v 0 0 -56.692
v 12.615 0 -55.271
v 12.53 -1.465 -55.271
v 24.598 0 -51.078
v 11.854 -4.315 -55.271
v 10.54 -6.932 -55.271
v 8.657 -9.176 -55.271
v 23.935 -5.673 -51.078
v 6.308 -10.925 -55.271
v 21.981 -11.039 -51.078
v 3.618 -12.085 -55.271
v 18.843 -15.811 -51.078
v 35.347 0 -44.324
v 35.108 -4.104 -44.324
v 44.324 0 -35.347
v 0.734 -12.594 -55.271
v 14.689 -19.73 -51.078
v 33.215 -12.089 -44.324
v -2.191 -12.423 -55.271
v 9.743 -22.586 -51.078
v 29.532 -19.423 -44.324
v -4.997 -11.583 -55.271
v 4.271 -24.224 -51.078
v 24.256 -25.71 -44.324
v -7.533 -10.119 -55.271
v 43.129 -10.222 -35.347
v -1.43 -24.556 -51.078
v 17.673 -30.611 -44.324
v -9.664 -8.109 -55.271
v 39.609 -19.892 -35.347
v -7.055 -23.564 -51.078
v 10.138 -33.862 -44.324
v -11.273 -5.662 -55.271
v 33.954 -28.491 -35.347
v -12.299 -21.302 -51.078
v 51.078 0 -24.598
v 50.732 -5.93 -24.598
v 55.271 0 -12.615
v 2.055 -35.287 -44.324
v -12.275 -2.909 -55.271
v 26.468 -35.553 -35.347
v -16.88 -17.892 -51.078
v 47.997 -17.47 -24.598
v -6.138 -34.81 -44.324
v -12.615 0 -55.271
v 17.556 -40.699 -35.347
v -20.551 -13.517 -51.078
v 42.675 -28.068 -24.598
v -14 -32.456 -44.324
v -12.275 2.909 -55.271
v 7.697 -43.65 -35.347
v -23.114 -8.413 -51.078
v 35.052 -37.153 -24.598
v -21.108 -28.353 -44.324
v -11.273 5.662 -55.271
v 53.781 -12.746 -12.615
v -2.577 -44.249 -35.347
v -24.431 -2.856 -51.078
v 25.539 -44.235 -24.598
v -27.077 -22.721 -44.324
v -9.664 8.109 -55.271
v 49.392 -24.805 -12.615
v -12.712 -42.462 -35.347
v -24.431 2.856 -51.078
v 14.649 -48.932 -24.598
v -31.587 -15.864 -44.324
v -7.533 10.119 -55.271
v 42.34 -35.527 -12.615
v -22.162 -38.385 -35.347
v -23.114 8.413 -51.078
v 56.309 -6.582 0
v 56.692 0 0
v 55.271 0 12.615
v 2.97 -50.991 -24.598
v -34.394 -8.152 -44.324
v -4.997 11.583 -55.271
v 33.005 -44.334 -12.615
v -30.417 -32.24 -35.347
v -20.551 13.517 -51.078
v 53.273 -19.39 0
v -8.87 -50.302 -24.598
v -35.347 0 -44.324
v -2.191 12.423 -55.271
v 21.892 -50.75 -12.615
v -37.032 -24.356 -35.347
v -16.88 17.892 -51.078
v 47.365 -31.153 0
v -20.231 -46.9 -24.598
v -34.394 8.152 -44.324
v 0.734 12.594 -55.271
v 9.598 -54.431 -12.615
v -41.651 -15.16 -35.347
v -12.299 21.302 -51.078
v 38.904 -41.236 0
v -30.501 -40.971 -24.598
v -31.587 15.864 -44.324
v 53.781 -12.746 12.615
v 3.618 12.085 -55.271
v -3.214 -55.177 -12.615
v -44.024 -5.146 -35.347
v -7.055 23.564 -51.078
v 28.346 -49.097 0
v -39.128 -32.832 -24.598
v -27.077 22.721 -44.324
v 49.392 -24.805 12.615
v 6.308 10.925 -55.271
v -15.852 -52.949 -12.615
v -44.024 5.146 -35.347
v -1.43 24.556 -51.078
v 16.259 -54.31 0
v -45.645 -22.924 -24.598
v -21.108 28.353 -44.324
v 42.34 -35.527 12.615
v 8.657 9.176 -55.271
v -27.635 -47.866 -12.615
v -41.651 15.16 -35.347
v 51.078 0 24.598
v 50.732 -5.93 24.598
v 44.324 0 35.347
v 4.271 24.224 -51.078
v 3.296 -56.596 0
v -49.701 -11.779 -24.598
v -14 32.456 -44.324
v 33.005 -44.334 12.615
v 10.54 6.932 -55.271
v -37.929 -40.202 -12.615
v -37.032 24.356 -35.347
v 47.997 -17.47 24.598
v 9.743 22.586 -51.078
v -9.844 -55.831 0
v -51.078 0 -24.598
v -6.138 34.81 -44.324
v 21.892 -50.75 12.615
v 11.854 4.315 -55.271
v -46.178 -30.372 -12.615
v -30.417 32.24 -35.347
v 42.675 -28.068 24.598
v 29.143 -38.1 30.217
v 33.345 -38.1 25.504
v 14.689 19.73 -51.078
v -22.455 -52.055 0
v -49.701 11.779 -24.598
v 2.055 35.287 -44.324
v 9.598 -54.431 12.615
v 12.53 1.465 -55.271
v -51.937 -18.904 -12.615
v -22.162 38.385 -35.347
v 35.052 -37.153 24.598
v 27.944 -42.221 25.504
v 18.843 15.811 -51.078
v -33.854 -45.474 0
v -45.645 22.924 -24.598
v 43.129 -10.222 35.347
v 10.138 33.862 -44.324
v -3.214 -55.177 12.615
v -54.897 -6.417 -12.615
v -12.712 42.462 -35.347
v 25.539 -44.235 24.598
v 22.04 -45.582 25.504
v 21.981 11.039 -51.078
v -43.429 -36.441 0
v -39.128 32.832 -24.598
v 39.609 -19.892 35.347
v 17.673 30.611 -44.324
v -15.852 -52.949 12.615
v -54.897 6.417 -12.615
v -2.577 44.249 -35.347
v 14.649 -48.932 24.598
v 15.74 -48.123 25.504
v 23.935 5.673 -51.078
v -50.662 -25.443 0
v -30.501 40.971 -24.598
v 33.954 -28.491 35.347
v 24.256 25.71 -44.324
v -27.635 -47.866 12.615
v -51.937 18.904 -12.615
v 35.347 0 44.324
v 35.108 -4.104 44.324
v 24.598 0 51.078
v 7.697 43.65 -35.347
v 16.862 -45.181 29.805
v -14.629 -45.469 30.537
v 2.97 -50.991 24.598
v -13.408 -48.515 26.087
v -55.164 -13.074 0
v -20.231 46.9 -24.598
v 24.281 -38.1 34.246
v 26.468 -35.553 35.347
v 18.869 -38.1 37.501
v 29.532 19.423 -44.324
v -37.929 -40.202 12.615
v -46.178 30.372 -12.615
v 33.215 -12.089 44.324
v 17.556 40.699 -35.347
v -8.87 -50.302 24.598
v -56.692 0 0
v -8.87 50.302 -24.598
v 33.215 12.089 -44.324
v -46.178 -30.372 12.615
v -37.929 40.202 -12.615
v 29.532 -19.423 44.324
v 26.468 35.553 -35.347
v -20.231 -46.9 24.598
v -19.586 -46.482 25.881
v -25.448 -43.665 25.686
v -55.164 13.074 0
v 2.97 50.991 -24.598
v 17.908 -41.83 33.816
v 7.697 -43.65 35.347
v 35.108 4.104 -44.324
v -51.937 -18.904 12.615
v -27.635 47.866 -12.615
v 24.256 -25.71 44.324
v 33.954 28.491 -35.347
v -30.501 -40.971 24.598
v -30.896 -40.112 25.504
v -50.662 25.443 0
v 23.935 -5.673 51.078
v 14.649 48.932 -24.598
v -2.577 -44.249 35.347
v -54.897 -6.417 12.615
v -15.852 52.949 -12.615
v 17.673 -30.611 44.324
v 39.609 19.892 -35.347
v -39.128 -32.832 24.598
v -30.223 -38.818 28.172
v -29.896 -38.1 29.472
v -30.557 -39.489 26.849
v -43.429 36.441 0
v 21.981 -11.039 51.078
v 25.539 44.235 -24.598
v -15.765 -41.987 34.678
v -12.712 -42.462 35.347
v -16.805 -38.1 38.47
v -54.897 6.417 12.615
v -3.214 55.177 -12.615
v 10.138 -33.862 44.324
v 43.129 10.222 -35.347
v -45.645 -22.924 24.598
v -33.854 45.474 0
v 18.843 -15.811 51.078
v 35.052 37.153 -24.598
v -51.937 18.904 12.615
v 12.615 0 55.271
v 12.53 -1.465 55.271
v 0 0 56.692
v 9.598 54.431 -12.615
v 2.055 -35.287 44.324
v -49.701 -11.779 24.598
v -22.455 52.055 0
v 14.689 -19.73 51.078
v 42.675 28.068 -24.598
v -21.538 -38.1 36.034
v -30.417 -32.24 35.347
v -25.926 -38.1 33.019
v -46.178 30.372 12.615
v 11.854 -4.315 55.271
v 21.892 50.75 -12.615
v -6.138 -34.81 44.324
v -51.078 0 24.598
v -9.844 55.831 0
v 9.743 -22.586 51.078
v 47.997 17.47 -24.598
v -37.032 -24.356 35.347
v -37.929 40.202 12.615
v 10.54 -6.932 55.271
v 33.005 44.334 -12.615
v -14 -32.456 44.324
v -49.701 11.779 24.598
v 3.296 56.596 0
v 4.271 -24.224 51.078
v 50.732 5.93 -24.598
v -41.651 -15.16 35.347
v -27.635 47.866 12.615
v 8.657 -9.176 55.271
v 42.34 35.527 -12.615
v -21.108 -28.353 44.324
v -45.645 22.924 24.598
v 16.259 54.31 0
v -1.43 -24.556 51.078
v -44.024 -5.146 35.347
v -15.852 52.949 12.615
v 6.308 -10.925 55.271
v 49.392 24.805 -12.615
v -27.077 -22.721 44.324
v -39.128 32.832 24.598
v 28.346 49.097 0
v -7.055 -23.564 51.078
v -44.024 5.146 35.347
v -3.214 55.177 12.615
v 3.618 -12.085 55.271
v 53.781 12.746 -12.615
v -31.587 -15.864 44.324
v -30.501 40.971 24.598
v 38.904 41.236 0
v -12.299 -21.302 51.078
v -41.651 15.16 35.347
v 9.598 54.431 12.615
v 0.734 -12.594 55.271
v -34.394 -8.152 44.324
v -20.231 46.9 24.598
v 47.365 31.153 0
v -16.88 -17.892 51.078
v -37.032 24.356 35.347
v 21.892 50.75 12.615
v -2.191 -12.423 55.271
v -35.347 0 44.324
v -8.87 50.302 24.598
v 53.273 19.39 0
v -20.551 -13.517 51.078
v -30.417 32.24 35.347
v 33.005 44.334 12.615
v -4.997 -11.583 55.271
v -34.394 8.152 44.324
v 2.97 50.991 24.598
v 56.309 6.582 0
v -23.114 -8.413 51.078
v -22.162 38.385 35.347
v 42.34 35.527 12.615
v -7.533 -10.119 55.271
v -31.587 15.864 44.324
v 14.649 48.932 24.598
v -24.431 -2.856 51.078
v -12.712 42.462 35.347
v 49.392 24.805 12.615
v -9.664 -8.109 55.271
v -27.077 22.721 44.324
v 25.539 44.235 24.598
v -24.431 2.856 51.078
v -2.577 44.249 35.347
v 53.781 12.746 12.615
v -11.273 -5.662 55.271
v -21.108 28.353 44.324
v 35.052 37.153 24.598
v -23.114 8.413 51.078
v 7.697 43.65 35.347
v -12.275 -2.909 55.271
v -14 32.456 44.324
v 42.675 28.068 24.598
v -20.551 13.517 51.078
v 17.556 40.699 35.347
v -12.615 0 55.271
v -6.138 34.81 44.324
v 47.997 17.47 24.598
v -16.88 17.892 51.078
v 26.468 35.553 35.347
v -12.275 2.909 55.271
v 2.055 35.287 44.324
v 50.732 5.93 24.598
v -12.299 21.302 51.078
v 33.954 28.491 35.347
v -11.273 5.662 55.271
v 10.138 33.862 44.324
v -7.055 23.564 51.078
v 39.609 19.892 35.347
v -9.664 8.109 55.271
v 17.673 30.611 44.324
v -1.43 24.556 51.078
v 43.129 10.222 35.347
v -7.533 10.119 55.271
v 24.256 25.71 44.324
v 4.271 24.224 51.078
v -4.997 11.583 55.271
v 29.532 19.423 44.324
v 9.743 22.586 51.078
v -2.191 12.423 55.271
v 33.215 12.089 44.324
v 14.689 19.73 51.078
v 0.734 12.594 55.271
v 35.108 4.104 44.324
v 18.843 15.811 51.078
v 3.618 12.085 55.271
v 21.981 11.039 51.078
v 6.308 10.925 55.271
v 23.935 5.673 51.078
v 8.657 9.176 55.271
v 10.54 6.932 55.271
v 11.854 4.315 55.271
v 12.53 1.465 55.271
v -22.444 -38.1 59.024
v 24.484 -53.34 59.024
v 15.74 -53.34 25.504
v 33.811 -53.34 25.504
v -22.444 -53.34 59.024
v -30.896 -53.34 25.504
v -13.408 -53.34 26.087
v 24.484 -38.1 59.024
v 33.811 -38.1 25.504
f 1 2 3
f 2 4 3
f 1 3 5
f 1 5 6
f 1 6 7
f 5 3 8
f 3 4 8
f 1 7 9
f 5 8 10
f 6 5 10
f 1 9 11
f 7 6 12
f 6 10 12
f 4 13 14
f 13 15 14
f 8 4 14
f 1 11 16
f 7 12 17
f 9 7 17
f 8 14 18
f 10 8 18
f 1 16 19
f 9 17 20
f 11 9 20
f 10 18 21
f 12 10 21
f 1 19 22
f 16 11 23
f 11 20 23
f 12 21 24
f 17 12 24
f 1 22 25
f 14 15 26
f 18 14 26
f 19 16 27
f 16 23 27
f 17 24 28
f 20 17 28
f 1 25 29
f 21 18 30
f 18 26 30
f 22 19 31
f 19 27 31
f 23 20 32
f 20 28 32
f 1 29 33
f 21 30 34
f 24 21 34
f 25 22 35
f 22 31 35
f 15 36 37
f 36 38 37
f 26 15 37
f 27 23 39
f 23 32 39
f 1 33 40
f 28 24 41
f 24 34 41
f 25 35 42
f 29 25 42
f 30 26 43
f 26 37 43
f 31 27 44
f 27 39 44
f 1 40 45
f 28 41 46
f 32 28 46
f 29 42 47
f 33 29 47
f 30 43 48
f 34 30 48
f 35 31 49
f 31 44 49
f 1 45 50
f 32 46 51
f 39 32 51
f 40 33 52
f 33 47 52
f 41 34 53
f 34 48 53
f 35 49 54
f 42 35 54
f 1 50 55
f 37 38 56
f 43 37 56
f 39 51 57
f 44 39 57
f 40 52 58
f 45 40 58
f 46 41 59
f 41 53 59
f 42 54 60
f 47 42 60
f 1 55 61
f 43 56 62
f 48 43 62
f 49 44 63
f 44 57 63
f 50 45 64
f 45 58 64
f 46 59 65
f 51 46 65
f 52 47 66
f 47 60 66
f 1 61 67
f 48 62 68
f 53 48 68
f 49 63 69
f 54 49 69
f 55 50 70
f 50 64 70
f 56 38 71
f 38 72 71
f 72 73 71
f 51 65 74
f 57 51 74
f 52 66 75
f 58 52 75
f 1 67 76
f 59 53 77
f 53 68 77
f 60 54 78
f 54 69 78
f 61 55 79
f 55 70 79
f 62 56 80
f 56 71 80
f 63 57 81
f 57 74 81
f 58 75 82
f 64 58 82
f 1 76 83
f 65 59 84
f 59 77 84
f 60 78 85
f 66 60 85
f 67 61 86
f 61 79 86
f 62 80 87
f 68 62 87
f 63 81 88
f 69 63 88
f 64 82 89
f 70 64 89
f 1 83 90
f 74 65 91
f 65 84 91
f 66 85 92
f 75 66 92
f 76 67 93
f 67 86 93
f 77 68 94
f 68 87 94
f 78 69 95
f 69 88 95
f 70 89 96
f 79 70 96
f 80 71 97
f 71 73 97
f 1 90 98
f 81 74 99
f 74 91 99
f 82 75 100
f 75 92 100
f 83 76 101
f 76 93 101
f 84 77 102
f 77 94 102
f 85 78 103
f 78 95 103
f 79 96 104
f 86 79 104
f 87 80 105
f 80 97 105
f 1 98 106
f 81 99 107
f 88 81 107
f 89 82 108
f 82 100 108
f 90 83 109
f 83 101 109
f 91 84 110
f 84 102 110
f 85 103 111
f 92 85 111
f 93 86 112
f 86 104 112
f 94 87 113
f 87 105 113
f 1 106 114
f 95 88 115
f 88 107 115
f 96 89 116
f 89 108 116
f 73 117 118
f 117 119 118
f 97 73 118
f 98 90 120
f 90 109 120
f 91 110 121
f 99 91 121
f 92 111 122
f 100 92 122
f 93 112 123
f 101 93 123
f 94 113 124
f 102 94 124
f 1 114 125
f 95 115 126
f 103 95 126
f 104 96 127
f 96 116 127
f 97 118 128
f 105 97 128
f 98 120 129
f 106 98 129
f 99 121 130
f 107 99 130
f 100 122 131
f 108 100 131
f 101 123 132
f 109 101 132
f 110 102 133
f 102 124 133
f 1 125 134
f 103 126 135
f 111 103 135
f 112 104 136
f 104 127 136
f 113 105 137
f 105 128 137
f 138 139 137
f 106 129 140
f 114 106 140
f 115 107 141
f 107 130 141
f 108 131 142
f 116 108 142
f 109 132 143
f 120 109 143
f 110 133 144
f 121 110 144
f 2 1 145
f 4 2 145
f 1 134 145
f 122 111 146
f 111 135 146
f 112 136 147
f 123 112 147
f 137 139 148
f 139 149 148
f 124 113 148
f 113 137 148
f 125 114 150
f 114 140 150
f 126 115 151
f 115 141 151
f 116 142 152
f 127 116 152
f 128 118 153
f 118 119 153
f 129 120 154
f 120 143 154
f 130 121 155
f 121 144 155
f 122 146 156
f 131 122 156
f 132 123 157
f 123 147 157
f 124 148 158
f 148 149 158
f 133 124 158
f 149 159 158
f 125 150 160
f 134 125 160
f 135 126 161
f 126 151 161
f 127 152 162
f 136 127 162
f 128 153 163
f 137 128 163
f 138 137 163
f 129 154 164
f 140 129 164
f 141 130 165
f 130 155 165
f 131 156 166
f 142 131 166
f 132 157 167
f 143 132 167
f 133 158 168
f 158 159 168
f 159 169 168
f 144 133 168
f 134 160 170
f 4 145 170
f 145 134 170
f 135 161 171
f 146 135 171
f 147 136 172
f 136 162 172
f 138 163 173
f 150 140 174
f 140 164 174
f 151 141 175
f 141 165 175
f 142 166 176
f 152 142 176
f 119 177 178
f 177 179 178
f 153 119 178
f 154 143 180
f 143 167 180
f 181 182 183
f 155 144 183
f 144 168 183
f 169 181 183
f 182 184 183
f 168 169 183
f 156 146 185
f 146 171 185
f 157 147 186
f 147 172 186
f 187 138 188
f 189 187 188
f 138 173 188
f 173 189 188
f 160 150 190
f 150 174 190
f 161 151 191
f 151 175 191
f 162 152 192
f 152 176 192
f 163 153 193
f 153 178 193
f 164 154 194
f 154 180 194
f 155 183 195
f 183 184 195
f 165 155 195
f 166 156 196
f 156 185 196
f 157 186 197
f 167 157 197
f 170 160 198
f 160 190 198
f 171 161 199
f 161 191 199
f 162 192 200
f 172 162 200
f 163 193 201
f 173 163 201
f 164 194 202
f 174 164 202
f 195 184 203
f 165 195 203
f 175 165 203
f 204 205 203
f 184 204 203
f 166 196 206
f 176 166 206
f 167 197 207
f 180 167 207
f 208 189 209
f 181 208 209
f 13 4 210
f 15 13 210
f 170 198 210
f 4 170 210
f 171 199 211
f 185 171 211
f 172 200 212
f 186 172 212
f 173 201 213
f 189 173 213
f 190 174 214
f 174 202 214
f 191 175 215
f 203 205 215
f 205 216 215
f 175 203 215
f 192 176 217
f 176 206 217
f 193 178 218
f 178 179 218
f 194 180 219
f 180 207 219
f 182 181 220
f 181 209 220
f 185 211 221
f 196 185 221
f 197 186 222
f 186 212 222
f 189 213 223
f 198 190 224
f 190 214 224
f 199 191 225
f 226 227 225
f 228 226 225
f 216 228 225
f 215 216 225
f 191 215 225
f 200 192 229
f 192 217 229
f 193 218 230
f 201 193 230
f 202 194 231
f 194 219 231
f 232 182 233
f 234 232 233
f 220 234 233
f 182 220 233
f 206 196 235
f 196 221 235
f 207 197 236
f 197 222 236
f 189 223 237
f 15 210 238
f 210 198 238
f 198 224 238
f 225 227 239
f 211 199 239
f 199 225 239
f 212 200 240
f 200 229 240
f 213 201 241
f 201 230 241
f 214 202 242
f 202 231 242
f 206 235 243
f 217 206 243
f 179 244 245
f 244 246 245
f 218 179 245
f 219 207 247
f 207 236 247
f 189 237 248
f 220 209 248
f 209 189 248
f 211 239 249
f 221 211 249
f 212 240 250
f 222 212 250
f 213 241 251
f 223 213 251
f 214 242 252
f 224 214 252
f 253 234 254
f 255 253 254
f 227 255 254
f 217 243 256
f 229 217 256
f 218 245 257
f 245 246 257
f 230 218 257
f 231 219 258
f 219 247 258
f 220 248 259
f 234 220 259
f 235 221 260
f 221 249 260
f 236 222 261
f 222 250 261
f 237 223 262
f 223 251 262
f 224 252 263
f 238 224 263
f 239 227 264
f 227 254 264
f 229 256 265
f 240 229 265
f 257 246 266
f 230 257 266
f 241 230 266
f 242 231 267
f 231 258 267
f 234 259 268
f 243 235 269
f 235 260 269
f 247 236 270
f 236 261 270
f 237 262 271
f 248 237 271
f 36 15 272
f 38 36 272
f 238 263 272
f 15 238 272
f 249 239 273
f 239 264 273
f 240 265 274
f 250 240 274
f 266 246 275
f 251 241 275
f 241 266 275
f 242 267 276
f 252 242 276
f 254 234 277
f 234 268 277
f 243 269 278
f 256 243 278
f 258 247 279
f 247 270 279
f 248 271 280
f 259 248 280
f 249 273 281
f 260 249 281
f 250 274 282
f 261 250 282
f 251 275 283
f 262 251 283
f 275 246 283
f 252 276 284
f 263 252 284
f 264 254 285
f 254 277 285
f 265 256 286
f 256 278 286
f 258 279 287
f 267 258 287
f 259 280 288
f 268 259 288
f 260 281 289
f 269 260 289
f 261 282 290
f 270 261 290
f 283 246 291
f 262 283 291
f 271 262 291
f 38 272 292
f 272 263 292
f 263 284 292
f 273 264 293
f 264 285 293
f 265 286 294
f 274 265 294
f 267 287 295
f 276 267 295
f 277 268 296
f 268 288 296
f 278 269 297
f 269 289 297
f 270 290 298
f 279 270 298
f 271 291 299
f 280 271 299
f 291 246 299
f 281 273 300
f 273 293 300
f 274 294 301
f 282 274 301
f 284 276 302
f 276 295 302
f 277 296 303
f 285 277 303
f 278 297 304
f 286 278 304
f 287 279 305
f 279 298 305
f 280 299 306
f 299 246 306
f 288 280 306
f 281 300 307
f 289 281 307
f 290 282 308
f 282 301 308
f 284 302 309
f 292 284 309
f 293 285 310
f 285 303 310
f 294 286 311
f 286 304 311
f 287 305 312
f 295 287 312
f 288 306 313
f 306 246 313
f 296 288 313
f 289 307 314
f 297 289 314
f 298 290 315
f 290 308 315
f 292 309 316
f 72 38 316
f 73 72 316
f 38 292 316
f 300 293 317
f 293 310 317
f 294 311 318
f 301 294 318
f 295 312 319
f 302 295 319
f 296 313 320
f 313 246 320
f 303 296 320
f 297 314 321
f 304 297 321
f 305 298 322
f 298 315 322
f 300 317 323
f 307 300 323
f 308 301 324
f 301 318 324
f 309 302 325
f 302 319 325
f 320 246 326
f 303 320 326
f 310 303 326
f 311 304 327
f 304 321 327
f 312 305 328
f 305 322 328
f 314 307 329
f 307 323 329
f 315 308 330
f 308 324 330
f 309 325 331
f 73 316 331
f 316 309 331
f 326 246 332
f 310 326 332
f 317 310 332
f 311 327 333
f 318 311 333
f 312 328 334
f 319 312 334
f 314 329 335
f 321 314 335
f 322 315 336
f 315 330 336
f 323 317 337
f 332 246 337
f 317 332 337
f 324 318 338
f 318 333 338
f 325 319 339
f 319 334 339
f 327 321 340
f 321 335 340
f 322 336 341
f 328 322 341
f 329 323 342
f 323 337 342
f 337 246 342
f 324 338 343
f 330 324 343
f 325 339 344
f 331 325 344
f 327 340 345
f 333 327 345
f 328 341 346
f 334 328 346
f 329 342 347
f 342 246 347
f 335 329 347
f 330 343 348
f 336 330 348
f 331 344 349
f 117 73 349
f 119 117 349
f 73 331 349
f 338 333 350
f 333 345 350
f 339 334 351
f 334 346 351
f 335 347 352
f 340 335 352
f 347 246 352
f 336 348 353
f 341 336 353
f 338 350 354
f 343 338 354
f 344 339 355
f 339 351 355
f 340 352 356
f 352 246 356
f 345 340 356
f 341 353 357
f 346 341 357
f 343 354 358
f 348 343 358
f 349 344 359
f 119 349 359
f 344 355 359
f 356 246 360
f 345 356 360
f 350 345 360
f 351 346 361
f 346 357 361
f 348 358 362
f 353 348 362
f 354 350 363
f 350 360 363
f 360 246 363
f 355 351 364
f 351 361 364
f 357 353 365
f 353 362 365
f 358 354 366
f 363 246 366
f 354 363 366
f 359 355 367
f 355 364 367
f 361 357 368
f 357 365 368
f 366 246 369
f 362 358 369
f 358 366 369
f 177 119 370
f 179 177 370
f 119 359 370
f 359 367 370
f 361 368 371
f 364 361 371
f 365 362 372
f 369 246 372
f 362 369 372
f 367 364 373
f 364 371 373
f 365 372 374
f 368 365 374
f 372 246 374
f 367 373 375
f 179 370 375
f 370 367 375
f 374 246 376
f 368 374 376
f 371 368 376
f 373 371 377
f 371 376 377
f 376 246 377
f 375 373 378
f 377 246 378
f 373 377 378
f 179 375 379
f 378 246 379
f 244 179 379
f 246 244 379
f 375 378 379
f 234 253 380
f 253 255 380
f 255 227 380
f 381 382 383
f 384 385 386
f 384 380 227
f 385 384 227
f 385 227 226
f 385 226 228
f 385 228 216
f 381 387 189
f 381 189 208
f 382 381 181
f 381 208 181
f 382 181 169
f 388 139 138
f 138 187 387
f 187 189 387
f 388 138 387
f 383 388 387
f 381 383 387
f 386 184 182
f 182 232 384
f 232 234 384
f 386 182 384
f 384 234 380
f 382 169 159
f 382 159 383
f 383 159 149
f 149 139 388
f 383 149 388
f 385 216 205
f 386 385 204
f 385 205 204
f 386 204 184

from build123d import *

# Parameters (mm, degrees)
F4_DEPTH = 15.24


with BuildPart() as f1:
    # F0 (on Front) → F1 (revolve)
    with BuildSketch(Plane.XZ):
        with BuildLine():
            Line((0, 56.691967), (0, -56.691967))
            ThreePointArc((0, -56.691967), (56.691967, 0), (0, 56.691967))
        make_face()
    revolve(axis=Axis((0, 0, 0.728689), (0, 0, -1)))

    # F3 (on offset) → F4 (join)
    with BuildSketch(Plane.XZ.offset(38.1)):
        Polygon((-22.443607, 59.023771), (-30.896394, 25.504097), (-13.407868, 26.087049), align=None)
        Polygon((24.483934, 59.023771), (15.739674, 25.504097), (33.811152, 25.504097), align=None)
    extrude(amount=F4_DEPTH)


solid = f1.part
